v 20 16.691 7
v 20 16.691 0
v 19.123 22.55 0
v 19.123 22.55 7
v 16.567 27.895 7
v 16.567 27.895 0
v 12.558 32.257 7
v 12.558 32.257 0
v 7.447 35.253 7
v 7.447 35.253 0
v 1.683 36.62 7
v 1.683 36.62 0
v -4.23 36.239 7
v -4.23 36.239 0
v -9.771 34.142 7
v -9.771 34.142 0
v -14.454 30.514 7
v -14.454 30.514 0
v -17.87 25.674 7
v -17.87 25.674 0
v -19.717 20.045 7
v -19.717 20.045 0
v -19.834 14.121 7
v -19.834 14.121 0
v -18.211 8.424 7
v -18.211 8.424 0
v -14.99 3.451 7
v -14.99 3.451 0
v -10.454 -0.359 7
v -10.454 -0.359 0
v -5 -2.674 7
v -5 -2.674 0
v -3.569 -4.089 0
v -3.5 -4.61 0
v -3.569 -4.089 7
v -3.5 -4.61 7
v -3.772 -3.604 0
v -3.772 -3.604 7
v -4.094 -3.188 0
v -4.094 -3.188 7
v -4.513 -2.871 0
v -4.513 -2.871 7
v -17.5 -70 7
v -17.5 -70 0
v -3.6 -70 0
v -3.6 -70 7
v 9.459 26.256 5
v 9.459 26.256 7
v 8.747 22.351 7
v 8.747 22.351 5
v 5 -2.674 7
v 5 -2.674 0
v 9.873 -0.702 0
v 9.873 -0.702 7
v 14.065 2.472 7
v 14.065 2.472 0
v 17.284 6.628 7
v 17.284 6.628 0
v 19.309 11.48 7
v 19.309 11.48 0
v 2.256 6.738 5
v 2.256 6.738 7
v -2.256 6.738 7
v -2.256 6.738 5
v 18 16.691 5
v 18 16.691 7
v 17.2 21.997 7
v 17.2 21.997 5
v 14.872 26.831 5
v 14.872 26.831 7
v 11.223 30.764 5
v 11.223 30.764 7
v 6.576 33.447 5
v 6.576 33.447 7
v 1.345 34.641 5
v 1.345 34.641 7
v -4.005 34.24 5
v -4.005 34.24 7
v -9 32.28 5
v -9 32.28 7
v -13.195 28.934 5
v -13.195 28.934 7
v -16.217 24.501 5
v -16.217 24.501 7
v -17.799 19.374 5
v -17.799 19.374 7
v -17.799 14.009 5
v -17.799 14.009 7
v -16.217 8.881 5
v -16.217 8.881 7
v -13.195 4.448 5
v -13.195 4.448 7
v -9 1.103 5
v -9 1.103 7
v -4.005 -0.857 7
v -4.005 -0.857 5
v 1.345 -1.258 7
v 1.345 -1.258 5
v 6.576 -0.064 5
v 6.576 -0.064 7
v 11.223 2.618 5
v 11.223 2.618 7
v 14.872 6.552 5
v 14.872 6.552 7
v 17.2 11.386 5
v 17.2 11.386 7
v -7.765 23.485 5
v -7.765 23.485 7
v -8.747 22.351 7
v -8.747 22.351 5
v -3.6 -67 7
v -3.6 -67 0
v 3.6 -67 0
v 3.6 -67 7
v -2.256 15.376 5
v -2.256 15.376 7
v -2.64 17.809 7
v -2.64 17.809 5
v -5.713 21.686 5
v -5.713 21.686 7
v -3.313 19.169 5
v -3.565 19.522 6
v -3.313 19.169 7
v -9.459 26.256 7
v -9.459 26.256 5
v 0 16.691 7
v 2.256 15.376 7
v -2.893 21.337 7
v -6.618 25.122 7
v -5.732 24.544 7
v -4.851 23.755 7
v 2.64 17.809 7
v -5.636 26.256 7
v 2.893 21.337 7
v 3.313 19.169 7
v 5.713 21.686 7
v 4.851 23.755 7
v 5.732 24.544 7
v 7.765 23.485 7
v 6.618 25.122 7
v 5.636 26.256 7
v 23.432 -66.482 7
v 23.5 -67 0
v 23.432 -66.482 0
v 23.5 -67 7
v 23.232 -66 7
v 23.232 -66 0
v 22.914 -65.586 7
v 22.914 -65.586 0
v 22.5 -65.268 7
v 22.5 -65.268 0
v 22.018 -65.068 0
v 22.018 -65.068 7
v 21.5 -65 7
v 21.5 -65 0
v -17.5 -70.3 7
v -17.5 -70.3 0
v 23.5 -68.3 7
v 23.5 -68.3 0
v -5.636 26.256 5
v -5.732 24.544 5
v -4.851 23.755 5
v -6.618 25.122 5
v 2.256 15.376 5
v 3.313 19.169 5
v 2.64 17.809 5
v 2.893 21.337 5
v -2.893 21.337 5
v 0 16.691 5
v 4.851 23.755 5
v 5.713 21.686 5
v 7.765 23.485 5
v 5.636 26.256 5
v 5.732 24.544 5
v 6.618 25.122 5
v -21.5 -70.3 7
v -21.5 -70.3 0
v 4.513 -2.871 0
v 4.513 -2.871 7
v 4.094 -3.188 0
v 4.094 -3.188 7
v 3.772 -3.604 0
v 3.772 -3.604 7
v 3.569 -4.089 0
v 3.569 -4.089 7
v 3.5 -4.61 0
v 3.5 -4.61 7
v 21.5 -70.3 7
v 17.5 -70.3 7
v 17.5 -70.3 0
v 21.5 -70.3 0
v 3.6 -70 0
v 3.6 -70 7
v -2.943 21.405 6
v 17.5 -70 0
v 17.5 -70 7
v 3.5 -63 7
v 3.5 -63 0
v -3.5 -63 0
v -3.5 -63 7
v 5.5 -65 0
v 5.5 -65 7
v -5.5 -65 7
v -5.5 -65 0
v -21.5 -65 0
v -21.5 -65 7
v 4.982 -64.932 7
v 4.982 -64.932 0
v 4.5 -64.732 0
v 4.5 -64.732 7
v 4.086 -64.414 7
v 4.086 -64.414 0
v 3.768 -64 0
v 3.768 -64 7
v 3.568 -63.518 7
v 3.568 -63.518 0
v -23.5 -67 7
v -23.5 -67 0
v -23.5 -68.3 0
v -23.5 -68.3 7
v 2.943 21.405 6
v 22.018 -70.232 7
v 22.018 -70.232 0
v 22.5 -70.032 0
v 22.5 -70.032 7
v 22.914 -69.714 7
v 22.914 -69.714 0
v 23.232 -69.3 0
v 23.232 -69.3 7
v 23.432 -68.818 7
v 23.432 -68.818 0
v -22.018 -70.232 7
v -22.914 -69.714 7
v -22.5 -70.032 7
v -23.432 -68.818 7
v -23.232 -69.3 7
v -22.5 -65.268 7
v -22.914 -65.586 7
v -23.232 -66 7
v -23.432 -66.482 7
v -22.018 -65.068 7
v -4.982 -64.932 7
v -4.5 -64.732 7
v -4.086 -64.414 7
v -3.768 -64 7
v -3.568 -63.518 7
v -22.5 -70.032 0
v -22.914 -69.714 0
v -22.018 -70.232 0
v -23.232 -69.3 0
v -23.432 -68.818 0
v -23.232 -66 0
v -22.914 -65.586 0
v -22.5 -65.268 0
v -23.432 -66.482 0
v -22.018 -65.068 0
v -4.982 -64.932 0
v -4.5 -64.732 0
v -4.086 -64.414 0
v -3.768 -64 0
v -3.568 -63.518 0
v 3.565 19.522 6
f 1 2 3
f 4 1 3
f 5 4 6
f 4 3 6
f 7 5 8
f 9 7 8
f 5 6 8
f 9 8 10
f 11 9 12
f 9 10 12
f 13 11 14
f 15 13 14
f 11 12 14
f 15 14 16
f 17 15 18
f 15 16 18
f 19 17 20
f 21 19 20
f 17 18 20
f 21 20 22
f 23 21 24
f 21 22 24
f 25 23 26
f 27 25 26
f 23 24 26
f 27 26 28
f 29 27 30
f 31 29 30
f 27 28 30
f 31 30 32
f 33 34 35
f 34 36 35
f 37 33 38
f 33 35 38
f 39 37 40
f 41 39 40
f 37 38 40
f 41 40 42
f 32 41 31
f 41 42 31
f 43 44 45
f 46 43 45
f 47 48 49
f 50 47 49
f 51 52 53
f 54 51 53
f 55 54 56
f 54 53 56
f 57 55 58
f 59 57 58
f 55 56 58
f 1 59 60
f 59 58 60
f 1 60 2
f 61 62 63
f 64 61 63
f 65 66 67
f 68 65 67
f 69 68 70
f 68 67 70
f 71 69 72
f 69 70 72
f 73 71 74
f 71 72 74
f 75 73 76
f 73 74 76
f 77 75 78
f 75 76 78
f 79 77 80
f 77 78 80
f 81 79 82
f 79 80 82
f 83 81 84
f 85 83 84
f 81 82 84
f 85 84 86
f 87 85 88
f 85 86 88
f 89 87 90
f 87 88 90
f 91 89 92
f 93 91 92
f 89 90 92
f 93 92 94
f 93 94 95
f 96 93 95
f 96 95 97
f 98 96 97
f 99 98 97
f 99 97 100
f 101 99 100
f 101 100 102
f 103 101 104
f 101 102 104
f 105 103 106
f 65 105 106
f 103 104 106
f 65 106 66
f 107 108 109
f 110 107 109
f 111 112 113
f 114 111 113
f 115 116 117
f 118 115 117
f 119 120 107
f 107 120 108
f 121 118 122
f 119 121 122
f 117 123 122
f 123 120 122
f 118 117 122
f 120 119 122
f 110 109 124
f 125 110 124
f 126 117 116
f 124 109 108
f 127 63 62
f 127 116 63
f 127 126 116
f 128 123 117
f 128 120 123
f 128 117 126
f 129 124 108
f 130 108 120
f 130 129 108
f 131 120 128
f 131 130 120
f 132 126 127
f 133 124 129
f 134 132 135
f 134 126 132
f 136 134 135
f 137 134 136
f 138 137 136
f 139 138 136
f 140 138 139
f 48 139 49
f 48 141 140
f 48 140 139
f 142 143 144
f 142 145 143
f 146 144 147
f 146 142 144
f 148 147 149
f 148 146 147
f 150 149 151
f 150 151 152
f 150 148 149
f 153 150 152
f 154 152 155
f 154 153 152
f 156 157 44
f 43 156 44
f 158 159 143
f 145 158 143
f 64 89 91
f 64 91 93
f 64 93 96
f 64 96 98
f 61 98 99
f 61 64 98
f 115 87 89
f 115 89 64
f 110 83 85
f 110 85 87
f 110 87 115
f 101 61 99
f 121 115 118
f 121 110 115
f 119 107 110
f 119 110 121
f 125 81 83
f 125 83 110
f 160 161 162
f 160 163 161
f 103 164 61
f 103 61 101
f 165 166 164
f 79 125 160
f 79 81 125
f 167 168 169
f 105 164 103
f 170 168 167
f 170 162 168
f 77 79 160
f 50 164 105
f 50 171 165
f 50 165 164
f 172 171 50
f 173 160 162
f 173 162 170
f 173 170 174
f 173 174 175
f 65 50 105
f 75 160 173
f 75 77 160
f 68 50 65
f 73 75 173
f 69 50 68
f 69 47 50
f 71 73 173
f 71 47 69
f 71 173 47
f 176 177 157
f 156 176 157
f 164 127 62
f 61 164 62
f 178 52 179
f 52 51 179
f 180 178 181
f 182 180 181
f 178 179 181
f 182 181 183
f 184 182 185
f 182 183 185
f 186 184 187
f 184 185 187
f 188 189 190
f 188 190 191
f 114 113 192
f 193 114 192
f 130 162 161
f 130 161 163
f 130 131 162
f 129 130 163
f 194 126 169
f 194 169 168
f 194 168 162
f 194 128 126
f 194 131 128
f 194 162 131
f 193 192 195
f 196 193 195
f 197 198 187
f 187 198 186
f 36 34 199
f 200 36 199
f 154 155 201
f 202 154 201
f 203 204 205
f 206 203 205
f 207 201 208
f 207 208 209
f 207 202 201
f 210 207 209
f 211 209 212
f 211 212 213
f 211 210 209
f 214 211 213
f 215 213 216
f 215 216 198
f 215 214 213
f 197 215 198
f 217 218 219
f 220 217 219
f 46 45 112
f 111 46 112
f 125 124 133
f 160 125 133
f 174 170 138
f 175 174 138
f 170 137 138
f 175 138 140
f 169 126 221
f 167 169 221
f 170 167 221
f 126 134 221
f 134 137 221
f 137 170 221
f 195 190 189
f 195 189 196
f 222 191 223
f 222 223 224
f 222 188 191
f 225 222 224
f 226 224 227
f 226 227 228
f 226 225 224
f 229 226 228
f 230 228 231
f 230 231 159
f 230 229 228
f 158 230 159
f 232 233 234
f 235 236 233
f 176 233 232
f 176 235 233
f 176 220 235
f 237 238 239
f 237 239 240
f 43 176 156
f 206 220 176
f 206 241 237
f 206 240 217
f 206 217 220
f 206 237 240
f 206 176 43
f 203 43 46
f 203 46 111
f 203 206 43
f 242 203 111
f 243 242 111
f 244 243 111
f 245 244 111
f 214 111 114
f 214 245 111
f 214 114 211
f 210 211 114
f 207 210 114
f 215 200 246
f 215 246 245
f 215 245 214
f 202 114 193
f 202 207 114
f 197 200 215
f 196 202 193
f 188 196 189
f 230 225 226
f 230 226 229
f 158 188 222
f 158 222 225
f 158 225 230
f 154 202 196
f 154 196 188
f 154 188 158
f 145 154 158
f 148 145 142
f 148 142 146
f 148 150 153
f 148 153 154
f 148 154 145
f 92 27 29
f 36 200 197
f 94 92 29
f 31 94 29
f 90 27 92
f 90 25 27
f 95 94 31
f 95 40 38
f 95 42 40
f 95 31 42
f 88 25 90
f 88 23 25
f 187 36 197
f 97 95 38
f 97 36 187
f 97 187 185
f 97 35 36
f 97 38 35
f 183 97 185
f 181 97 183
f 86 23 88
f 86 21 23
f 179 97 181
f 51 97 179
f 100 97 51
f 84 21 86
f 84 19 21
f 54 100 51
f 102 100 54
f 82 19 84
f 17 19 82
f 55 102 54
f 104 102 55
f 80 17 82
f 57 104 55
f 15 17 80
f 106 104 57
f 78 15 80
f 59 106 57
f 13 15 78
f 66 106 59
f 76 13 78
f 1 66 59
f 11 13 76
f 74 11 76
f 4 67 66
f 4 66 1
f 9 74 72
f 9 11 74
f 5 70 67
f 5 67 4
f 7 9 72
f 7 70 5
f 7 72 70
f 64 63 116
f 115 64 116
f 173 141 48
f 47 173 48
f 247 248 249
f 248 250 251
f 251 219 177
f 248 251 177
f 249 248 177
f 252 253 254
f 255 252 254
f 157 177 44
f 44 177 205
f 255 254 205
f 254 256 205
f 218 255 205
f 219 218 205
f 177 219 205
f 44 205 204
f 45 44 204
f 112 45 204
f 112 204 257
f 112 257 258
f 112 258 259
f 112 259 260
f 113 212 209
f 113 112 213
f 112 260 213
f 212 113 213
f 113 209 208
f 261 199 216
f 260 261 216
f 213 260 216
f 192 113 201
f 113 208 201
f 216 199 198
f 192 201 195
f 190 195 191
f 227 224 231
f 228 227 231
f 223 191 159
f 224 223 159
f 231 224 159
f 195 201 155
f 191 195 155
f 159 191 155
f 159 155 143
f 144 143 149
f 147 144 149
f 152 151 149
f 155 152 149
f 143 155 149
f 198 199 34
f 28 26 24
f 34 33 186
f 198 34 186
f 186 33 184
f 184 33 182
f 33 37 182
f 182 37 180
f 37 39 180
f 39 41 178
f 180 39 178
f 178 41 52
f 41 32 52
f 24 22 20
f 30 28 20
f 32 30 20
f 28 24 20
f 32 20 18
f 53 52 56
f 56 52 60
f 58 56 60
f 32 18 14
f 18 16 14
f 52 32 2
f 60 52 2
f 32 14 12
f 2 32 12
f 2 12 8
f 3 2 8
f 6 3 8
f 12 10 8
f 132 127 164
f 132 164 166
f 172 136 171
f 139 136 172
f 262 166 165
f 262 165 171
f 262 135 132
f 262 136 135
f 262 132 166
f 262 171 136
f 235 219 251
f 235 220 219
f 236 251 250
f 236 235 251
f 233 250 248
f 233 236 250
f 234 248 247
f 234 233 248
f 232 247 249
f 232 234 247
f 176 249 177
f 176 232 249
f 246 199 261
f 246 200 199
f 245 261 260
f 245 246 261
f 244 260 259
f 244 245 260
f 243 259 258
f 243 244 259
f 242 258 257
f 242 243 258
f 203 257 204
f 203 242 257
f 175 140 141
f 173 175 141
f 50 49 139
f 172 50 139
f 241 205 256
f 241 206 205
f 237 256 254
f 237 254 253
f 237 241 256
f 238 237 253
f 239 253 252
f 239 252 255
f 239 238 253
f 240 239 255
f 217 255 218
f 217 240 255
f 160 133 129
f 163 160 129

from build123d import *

# Parameters (mm, degrees)
F0_W     = 6
F0_H     = 0.3
F1_DEPTH = 7
F2_R     = 18
F3_DEPTH = 2
F4_R     = 2


# Not quite as in the source:
# - a feature names something its author has since deleted; it is built from what else it names


with BuildPart() as f1:
    # F0 (on Top) → F1 (new body)
    with BuildSketch(Plane.XY):
        with BuildLine():
            ThreePointArc((3.5, -3), (0, -3.3086313325), (-3.5, -3))
            Line((-3.5, -3), (-3.5, -65))
            Line((-3.5, -65), (-23.5, -65))
            Line((-23.5, -65), (-23.5, -70))
            Line((-23.5, -70), (-17.5, -70))
            Line((-17.5, -70), (-3.6, -70))
            Line((-3.6, -70), (-3.6, -67))
            Line((-3.6, -67), (3.6, -67))
            Line((3.6, -67), (3.6, -70))
            Line((3.6, -70), (17.5, -70))
            Line((17.5, -70), (23.5, -70))
            Line((23.5, -70), (23.5, -65))
            Line((23.5, -65), (3.5, -65))
            Line((3.5, -65), (3.5, -3))
        make_face()
        with BuildLine():
            ThreePointArc((20, 16.6913686675), (-12.8452325787, 32.0210783843), (-3.5, -3))
            ThreePointArc((-3.5, -3), (0, -3.3086313325), (3.5, -3))
            ThreePointArc((3.5, -3), (15.3297097168, 3.8461360889), (20, 16.6913686675))
        make_face()
        with Locations((-20.5, -70.15)):
            Rectangle(F0_W, F0_H)
        with Locations((20.5, -70.15)):
            Rectangle(F0_W, F0_H)
    extrude(amount=F1_DEPTH)

    # F2 (on face) → F3 (cut)
    with BuildSketch(Plane.XY.offset(7)):
        with Locations((0, 16.6913686675)):
            Circle(F2_R)
        with BuildLine():
            Line((0, 6.7382790148), (-2.256068401, 6.7382790148))
            Line((-2.256068401, 6.7382790148), (-2.256068401, 15.3757622465))
            add(Edge.make_bspline(
                [(-2.256068401, 15.3757622465), (-2.3233316964, 16.8329796939), (-2.719622442, 19.6479913649), (-7.1642837958, 22.803266535), (-7.7653425934, 23.4845241077)],
                knots=[0, 0, 0, 0, 0.4646113757, 1, 1, 1, 1], degree=3))
            Line((-7.7653425934, 23.4845241077), (-8.7472228794, 22.3505439034))
            Line((-8.7472228794, 22.3505439034), (-9.4585691677, 26.2563616887))
            Line((-9.4585691677, 26.2563616887), (-5.635671728, 26.2563616887))
            Line((-5.635671728, 26.2563616887), (-6.6175520141, 25.1223814843))
            add(Edge.make_bspline(
                [(0, 16.6913686675), (-0.8485280711, 18.3885709355), (-2.8253206301, 21.3582120071), (-5.1400469891, 24.3331446203), (-6.6175520141, 25.1223814843)],
                knots=[0, 0, 0, 0, 0.5076375045, 1, 1, 1, 1], degree=3))
            add(Edge.make_bspline(
                [(0, 16.6913686675), (0.8485280711, 18.3885709355), (2.8253206301, 21.3582120071), (5.1400469891, 24.3331446203), (6.6175520141, 25.1223814843)],
                knots=[0, 0, 0, 0, 0.5076375045, 1, 1, 1, 1], degree=3))
            Line((6.6175520141, 25.1223814843), (5.635671728, 26.2563616887))
            Line((5.635671728, 26.2563616887), (9.4585691677, 26.2563616887))
            Line((9.4585691677, 26.2563616887), (8.7472228794, 22.3505439034))
            Line((8.7472228794, 22.3505439034), (7.7653425934, 23.4845241077))
            add(Edge.make_bspline(
                [(2.256068401, 15.3757622465), (2.3233316964, 16.8329796939), (2.719622442, 19.6479913649), (7.1642837958, 22.803266535), (7.7653425934, 23.4845241077)],
                knots=[0, 0, 0, 0, 0.4646113757, 1, 1, 1, 1], degree=3))
            Line((2.256068401, 15.3757622465), (2.256068401, 6.7382790148))
            Line((2.256068401, 6.7382790148), (0, 6.7382790148))
        make_face(mode=Mode.SUBTRACT)
    extrude(amount=-F3_DEPTH, mode=Mode.SUBTRACT)

    # F4
    f4_edges = [f1.edges().sort_by_distance(p)[0] for p in [
        (-3.5, -3, 3.5),
        (3.5, -3, 3.5),
        (23.5, -65, 3.5),
        (-23.5, -65, 3.5),
        (-3.5, -65, 3.5),
        (3.5, -65, 3.5),
        (-23.5, -70.3, 3.5),
        (23.5, -70.3, 3.5),
    ]]
    fillet(f4_edges, radius=F4_R)


solid = f1.part
